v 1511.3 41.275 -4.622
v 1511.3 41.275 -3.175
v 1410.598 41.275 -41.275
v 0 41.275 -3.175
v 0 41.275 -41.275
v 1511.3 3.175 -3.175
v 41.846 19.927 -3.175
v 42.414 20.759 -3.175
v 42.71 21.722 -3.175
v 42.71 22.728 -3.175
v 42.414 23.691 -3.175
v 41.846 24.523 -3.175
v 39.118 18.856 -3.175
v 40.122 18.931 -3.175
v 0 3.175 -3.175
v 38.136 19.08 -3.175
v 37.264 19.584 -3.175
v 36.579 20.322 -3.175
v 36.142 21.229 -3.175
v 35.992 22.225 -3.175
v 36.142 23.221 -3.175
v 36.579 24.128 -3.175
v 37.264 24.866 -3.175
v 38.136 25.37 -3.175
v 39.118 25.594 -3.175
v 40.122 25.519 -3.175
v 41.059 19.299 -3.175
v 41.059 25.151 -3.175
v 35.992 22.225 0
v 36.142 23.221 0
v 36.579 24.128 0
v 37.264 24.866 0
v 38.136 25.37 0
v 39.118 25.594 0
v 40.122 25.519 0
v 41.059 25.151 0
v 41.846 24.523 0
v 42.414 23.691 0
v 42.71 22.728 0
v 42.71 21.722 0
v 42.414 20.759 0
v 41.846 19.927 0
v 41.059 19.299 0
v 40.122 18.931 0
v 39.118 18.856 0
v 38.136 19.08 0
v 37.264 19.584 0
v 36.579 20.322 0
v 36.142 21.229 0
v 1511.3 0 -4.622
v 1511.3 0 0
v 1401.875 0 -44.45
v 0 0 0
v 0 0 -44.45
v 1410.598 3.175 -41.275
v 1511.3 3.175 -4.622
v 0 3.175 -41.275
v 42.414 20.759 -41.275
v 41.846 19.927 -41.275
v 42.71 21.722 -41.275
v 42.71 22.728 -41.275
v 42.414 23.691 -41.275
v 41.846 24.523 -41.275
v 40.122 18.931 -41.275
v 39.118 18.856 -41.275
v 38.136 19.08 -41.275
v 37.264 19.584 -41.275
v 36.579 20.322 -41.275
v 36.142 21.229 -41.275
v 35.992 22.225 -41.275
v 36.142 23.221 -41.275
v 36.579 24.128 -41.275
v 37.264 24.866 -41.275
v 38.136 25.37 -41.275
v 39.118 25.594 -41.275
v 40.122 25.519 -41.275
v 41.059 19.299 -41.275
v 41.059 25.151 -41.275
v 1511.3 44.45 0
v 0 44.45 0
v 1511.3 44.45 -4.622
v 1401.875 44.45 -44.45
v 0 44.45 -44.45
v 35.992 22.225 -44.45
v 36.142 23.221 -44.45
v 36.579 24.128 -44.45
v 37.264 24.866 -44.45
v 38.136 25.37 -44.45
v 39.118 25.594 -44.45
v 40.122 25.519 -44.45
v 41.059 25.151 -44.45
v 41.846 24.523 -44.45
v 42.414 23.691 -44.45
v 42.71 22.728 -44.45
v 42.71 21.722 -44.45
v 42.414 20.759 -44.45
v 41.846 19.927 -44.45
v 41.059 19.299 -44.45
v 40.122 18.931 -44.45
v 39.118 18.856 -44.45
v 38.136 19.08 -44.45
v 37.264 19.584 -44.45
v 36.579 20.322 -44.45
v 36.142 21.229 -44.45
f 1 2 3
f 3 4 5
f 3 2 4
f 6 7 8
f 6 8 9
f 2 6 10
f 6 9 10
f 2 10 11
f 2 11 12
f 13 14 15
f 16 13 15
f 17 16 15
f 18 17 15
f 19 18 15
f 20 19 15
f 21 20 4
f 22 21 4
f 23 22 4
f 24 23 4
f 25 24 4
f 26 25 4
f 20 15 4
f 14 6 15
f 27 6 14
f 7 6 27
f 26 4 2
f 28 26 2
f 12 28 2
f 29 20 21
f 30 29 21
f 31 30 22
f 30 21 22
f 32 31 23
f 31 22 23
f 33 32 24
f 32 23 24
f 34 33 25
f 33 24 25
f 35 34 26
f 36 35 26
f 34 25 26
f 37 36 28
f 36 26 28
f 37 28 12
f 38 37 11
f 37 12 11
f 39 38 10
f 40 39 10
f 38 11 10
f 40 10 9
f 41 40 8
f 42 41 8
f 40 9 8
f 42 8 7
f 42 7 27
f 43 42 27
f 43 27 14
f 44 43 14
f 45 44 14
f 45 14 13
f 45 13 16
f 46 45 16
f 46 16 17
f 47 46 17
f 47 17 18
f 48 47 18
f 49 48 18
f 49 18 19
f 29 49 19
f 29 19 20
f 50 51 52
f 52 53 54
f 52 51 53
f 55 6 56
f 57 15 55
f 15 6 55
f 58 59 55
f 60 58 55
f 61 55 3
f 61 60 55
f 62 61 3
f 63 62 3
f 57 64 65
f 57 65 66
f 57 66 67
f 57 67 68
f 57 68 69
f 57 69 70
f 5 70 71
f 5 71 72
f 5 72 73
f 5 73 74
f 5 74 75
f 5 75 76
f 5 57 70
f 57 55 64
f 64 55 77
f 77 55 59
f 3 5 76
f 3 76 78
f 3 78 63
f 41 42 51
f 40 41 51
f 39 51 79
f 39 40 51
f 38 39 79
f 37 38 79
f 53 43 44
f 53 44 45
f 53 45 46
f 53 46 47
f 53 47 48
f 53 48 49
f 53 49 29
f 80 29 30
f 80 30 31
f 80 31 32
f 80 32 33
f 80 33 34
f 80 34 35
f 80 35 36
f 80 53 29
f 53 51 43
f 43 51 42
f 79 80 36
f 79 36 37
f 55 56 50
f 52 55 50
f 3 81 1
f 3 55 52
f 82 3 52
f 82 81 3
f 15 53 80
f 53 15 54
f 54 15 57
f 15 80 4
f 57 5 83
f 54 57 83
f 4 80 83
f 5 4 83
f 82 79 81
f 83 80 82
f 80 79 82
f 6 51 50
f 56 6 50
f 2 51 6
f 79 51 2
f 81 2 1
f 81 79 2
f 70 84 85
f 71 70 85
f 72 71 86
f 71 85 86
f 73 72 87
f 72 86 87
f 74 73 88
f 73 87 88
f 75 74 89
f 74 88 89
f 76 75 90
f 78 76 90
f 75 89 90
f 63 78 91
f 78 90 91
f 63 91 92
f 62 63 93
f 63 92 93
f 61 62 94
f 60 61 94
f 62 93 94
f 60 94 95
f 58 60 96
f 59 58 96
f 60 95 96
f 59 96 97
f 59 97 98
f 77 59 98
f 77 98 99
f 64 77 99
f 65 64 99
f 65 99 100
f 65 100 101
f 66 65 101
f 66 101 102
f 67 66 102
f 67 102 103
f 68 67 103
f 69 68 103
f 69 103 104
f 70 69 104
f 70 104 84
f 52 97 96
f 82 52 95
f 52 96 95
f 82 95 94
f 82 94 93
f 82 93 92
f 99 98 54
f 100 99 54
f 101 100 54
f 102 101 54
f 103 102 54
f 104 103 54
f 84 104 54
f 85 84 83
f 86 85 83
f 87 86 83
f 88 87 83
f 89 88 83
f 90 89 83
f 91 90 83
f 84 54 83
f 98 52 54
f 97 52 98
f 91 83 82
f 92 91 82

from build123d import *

# Parameters (mm, degrees)
SKETCH1_W               = 44.45
SKETCH1_H               = 44.45
SKETCH1_W_2             = 38.1
SKETCH1_H_2             = 38.1
BOSS_EXTRUDE1_DEPTH     = 1524
CUT_EXTRUDE1_DEPTH      = 45.45
F_1_4_CLEARANCE_HOLE1_D = 6.7564
CUT_EXTRUDE2_DEPTH      = 45.45


with BuildPart() as part:
    # Sketch1 → Boss-Extrude1 (new body)
    with BuildSketch(Plane(origin=(0, 0, 0), x_dir=(0, 0, -1), z_dir=(1, 0, 0))):
        with Locations((22.225, 22.225)):
            Rectangle(SKETCH1_W, SKETCH1_H)
        with Locations((22.225, 22.225)):
            Rectangle(SKETCH1_W_2, SKETCH1_H_2, mode=Mode.SUBTRACT)
    extrude(amount=BOSS_EXTRUDE1_DEPTH)

    # Sketch2 → Cut-Extrude1 (cut, through all)
    with BuildSketch(Plane(origin=(0, 44.45, 0), x_dir=(1, 0, 0), z_dir=(0, 1, 0))):
        Polygon((1524, 0), (1401.874628705, 44.45), (1524, 44.45), align=None)
    extrude(amount=-CUT_EXTRUDE1_DEPTH, mode=Mode.SUBTRACT)

    # 1/4 Clearance Hole1 (through all)
    with Locations(Plane.XY):
        with Locations((39.37, 22.225)):
            Hole(F_1_4_CLEARANCE_HOLE1_D / 2)

    # Sketch5 → Cut-Extrude2 (cut, through all)
    with BuildSketch(Plane(origin=(0, 44.45, 0), x_dir=(1, 0, 0), z_dir=(0, 1, 0))):
        Polygon((1524, 0), (1511.3, 0), (1511.3, 4.622421975), align=None)
    extrude(amount=-CUT_EXTRUDE2_DEPTH, mode=Mode.SUBTRACT)


solid = part.part
